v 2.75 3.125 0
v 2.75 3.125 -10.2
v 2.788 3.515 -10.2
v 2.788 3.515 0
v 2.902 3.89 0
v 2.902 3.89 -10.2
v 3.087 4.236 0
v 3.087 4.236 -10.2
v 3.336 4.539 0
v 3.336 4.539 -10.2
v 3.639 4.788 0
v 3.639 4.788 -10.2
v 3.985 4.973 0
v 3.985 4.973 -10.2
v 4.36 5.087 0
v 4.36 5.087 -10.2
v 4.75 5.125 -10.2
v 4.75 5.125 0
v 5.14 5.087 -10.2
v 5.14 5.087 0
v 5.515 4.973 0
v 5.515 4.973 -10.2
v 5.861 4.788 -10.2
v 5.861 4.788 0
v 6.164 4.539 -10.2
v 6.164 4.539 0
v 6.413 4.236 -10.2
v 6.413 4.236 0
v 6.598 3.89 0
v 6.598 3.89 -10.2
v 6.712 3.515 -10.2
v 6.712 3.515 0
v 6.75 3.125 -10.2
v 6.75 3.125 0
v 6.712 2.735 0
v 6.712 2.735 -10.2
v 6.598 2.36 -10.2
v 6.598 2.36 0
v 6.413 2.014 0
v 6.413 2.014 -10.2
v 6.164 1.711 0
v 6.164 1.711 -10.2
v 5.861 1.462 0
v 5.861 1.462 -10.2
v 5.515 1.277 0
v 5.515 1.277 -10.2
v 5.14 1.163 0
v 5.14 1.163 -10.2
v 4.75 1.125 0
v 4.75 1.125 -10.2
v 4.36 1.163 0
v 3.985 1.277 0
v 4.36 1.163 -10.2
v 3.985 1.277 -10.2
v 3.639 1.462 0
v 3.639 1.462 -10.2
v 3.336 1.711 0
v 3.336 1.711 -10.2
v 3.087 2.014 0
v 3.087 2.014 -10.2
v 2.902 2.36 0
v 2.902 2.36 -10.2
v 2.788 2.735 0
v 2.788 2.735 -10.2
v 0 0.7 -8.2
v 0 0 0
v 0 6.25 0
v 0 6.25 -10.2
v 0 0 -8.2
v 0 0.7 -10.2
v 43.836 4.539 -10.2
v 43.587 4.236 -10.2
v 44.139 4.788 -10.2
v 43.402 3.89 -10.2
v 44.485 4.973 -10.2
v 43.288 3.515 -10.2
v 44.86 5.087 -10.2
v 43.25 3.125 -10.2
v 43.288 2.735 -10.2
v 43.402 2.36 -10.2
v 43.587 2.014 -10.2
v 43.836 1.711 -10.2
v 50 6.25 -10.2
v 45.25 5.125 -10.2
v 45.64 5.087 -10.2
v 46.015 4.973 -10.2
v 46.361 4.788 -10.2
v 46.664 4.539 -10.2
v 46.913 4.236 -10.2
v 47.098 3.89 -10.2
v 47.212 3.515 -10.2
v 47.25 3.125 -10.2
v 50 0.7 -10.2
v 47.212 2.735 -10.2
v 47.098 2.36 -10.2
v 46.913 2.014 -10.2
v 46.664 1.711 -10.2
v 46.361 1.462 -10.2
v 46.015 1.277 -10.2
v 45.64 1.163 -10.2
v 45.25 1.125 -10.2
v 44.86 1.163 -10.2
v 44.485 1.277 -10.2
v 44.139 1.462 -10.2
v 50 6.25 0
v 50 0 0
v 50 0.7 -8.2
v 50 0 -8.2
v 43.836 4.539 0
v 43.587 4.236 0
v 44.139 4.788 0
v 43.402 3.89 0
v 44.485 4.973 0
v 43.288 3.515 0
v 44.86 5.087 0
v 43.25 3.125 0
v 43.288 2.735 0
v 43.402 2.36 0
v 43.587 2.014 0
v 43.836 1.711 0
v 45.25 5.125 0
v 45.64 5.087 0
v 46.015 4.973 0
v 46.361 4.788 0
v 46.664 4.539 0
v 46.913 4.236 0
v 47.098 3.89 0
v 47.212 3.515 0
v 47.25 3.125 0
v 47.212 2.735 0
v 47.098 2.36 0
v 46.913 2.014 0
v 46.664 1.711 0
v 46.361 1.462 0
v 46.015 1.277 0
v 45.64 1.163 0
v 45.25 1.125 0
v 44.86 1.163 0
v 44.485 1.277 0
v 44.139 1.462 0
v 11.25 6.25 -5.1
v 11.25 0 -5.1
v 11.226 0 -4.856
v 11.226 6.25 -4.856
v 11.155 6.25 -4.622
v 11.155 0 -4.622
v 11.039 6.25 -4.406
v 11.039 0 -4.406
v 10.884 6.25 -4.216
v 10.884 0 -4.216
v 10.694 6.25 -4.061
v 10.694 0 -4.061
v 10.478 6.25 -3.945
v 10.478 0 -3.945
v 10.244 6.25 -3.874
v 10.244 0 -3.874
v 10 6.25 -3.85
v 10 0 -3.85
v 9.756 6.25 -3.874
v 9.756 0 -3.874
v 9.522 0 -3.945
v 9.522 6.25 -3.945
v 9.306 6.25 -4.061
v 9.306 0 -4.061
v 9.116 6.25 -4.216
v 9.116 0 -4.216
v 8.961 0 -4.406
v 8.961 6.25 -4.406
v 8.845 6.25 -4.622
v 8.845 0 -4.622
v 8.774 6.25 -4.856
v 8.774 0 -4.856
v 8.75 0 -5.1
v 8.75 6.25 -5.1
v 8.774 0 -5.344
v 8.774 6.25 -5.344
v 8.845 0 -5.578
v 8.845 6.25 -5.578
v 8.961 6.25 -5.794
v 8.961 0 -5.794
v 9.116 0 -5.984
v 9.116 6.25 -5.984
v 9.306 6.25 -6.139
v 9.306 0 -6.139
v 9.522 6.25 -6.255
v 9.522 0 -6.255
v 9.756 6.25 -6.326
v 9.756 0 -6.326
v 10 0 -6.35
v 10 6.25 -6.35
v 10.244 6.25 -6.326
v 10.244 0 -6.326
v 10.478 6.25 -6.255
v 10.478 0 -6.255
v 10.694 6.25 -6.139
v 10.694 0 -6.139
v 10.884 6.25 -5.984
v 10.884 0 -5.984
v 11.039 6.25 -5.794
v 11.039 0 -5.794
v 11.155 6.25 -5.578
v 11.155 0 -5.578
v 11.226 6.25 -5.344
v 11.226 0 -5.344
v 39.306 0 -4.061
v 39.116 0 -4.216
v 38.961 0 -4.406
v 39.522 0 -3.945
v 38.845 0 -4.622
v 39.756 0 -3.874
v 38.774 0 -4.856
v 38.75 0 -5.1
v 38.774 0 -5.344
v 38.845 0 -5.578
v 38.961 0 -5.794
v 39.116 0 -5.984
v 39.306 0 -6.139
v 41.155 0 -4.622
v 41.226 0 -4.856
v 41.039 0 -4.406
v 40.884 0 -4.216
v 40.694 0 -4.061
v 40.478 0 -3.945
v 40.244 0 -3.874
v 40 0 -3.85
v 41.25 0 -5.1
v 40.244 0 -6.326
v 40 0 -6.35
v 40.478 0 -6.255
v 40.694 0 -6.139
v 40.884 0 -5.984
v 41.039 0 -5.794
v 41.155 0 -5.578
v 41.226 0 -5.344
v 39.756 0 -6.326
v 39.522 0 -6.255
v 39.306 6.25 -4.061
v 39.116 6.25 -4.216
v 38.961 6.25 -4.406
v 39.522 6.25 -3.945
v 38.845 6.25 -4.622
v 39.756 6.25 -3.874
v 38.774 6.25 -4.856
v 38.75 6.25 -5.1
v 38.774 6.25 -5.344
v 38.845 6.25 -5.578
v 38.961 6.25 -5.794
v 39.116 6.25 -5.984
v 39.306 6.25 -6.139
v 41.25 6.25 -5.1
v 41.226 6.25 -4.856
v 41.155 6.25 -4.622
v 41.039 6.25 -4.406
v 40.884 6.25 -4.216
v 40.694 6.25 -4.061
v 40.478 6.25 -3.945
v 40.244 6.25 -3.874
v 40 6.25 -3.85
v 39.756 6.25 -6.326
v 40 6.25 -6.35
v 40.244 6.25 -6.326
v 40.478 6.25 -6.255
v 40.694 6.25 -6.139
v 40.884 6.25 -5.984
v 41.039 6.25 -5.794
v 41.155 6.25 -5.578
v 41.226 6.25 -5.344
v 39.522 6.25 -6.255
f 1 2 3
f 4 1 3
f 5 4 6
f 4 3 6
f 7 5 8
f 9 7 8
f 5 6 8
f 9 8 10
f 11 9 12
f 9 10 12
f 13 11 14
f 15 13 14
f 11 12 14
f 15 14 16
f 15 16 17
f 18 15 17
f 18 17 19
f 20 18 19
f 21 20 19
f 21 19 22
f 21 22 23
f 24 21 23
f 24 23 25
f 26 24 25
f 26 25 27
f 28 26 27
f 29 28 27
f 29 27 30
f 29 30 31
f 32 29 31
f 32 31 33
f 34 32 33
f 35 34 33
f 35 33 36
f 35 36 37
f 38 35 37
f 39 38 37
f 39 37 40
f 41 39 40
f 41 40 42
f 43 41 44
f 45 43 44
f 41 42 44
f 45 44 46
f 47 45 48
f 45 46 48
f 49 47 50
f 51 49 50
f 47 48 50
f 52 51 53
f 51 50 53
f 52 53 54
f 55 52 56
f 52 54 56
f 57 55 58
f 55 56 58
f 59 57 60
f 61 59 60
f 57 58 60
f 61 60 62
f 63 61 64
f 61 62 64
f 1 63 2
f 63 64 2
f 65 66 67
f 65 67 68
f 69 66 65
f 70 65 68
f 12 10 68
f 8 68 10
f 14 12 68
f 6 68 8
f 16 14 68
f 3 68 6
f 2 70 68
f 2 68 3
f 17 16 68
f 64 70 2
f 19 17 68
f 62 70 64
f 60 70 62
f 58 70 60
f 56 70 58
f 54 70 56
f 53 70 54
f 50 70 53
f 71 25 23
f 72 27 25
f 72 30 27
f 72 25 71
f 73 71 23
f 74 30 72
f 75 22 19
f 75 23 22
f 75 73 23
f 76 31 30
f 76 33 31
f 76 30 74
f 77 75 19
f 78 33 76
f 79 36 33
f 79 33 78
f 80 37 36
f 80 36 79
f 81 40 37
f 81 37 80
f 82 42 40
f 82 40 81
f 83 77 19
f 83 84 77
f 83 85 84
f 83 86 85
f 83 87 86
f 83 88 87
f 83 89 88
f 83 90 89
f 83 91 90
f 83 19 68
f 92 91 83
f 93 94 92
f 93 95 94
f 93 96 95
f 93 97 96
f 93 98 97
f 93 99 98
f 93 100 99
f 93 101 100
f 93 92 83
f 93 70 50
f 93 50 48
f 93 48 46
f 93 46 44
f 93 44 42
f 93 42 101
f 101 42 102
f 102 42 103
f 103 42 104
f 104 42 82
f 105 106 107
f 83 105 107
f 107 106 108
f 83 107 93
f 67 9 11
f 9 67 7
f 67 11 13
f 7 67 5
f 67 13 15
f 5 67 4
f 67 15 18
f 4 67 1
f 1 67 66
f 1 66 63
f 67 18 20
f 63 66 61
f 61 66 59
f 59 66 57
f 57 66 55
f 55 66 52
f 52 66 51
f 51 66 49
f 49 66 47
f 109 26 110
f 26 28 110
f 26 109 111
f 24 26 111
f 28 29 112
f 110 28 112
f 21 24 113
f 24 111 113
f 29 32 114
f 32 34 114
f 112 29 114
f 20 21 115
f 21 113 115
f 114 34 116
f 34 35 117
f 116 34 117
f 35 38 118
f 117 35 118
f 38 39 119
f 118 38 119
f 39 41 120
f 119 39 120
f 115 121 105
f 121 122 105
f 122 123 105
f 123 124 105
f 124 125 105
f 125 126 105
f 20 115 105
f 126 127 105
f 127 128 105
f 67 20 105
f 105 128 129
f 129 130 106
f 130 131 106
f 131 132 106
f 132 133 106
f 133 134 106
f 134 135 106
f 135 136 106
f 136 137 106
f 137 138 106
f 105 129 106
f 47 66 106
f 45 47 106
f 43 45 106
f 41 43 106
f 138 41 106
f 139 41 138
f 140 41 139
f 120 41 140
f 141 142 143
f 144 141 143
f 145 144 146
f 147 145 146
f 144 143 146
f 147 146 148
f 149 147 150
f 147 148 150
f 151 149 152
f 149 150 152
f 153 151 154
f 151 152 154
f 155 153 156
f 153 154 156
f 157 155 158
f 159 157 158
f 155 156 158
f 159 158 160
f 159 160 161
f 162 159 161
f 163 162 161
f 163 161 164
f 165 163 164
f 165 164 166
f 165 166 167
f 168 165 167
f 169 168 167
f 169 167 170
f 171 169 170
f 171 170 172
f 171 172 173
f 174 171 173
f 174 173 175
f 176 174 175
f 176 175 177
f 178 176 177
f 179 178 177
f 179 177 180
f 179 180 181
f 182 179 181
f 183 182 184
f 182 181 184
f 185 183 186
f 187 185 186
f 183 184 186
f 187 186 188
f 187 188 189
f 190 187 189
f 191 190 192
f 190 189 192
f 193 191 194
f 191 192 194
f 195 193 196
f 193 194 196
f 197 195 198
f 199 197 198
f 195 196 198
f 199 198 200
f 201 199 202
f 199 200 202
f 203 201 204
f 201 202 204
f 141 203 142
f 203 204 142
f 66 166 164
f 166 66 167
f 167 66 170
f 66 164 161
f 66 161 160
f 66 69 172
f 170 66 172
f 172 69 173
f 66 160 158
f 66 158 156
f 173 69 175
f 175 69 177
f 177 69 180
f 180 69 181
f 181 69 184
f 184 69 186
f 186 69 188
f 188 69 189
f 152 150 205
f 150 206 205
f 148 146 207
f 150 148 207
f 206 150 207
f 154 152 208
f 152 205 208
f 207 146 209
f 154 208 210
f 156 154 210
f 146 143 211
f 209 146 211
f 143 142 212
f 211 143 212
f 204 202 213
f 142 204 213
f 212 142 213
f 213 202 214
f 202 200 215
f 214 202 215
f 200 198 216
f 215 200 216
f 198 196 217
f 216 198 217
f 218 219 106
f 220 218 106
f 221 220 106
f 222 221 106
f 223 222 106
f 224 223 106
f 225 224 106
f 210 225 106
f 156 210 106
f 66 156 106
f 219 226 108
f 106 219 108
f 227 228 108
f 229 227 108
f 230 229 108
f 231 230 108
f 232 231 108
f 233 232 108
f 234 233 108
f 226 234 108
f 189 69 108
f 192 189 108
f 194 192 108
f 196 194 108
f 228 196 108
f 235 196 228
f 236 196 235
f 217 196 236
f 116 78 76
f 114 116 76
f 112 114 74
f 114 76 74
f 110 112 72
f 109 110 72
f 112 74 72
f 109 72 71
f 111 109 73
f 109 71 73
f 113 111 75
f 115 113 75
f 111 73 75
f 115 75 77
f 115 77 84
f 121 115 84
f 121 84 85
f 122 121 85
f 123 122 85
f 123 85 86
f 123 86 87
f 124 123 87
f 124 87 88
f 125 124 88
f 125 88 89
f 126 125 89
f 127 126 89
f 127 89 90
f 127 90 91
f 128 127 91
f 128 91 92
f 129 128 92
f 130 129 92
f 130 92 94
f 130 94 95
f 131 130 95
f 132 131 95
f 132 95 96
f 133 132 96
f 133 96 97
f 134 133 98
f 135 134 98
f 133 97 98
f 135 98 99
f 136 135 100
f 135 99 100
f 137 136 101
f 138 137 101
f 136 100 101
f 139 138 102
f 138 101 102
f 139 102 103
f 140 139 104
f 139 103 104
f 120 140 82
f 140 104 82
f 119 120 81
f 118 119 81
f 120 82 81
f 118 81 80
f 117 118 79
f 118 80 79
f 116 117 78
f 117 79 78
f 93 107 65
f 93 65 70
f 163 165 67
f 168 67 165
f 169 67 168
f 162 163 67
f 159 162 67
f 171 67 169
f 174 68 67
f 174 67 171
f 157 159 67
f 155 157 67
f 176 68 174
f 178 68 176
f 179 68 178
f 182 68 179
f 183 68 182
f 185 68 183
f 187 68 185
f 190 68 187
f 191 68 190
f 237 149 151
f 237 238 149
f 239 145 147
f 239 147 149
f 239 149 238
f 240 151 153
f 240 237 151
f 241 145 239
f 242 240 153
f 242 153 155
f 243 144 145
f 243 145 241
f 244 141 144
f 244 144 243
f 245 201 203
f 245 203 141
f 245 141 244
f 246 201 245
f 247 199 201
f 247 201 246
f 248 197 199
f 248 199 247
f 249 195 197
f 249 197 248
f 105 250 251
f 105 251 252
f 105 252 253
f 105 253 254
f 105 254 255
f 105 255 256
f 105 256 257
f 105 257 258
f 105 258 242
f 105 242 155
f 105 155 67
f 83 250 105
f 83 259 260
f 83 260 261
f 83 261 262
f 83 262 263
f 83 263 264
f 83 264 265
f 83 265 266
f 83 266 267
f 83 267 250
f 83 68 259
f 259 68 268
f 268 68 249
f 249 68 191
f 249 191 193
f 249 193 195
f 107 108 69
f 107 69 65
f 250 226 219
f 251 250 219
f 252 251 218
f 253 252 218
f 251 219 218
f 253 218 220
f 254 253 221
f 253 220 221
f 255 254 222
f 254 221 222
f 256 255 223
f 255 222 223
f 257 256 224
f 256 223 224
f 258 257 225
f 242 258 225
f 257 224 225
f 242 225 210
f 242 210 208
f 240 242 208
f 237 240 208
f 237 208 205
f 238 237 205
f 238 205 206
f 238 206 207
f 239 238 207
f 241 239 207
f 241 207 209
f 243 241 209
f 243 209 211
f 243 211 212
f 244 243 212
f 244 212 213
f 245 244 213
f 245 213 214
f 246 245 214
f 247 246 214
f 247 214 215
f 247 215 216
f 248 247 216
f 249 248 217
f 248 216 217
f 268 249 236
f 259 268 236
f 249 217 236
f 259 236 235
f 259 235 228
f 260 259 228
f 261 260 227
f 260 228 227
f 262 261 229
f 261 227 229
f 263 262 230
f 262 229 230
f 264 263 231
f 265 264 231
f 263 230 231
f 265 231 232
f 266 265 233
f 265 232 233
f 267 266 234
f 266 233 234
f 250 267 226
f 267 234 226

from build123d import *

# Parameters (mm, degrees)
SKETCH1_W                  = 50
SKETCH1_H                  = 10.2
BOSS_EXTRUDE1_DEPTH        = 6.25
F_4_0_4_DIAMETER_HOLE1_D   = 4
F_2_5_2_5_DIAMETER_HOLE1_D = 2.5
SKETCH6_W                  = 2
SKETCH6_H                  = 0.7
CUT_EXTRUDE1_DEPTH         = 51


with BuildPart() as part:
    # Sketch1 → Boss-Extrude1 (new body)
    with BuildSketch(Plane(origin=(0, 0, 0), x_dir=(1, 0, 0), z_dir=(0, 1, 0))):
        with Locations((25, 5.1)):
            Rectangle(SKETCH1_W, SKETCH1_H)
    extrude(amount=BOSS_EXTRUDE1_DEPTH)

    # Ø4.0 (4) Diameter Hole1 (through all)
    with Locations(Plane.XY):
        with Locations((4.75, 3.125), (45.25, 3.125)):
            Hole(F_4_0_4_DIAMETER_HOLE1_D / 2)

    # Ø2.5 (2.5) Diameter Hole1 (through all)
    with Locations(Plane(origin=(0, 6.25, 0), x_dir=(-1, 0, 0), z_dir=(0, 1, 0))):
        with Locations((-10, -5.1), (-40, -5.1)):
            Hole(F_2_5_2_5_DIAMETER_HOLE1_D / 2)

    # Sketch6 → Cut-Extrude1 (cut, through all)
    with BuildSketch(Plane(origin=(50, 0, 0), x_dir=(0, 0, -1), z_dir=(1, 0, 0))):
        with Locations((9.2, 0.35)):
            Rectangle(SKETCH6_W, SKETCH6_H)
    extrude(amount=-CUT_EXTRUDE1_DEPTH, mode=Mode.SUBTRACT)


solid = part.part
